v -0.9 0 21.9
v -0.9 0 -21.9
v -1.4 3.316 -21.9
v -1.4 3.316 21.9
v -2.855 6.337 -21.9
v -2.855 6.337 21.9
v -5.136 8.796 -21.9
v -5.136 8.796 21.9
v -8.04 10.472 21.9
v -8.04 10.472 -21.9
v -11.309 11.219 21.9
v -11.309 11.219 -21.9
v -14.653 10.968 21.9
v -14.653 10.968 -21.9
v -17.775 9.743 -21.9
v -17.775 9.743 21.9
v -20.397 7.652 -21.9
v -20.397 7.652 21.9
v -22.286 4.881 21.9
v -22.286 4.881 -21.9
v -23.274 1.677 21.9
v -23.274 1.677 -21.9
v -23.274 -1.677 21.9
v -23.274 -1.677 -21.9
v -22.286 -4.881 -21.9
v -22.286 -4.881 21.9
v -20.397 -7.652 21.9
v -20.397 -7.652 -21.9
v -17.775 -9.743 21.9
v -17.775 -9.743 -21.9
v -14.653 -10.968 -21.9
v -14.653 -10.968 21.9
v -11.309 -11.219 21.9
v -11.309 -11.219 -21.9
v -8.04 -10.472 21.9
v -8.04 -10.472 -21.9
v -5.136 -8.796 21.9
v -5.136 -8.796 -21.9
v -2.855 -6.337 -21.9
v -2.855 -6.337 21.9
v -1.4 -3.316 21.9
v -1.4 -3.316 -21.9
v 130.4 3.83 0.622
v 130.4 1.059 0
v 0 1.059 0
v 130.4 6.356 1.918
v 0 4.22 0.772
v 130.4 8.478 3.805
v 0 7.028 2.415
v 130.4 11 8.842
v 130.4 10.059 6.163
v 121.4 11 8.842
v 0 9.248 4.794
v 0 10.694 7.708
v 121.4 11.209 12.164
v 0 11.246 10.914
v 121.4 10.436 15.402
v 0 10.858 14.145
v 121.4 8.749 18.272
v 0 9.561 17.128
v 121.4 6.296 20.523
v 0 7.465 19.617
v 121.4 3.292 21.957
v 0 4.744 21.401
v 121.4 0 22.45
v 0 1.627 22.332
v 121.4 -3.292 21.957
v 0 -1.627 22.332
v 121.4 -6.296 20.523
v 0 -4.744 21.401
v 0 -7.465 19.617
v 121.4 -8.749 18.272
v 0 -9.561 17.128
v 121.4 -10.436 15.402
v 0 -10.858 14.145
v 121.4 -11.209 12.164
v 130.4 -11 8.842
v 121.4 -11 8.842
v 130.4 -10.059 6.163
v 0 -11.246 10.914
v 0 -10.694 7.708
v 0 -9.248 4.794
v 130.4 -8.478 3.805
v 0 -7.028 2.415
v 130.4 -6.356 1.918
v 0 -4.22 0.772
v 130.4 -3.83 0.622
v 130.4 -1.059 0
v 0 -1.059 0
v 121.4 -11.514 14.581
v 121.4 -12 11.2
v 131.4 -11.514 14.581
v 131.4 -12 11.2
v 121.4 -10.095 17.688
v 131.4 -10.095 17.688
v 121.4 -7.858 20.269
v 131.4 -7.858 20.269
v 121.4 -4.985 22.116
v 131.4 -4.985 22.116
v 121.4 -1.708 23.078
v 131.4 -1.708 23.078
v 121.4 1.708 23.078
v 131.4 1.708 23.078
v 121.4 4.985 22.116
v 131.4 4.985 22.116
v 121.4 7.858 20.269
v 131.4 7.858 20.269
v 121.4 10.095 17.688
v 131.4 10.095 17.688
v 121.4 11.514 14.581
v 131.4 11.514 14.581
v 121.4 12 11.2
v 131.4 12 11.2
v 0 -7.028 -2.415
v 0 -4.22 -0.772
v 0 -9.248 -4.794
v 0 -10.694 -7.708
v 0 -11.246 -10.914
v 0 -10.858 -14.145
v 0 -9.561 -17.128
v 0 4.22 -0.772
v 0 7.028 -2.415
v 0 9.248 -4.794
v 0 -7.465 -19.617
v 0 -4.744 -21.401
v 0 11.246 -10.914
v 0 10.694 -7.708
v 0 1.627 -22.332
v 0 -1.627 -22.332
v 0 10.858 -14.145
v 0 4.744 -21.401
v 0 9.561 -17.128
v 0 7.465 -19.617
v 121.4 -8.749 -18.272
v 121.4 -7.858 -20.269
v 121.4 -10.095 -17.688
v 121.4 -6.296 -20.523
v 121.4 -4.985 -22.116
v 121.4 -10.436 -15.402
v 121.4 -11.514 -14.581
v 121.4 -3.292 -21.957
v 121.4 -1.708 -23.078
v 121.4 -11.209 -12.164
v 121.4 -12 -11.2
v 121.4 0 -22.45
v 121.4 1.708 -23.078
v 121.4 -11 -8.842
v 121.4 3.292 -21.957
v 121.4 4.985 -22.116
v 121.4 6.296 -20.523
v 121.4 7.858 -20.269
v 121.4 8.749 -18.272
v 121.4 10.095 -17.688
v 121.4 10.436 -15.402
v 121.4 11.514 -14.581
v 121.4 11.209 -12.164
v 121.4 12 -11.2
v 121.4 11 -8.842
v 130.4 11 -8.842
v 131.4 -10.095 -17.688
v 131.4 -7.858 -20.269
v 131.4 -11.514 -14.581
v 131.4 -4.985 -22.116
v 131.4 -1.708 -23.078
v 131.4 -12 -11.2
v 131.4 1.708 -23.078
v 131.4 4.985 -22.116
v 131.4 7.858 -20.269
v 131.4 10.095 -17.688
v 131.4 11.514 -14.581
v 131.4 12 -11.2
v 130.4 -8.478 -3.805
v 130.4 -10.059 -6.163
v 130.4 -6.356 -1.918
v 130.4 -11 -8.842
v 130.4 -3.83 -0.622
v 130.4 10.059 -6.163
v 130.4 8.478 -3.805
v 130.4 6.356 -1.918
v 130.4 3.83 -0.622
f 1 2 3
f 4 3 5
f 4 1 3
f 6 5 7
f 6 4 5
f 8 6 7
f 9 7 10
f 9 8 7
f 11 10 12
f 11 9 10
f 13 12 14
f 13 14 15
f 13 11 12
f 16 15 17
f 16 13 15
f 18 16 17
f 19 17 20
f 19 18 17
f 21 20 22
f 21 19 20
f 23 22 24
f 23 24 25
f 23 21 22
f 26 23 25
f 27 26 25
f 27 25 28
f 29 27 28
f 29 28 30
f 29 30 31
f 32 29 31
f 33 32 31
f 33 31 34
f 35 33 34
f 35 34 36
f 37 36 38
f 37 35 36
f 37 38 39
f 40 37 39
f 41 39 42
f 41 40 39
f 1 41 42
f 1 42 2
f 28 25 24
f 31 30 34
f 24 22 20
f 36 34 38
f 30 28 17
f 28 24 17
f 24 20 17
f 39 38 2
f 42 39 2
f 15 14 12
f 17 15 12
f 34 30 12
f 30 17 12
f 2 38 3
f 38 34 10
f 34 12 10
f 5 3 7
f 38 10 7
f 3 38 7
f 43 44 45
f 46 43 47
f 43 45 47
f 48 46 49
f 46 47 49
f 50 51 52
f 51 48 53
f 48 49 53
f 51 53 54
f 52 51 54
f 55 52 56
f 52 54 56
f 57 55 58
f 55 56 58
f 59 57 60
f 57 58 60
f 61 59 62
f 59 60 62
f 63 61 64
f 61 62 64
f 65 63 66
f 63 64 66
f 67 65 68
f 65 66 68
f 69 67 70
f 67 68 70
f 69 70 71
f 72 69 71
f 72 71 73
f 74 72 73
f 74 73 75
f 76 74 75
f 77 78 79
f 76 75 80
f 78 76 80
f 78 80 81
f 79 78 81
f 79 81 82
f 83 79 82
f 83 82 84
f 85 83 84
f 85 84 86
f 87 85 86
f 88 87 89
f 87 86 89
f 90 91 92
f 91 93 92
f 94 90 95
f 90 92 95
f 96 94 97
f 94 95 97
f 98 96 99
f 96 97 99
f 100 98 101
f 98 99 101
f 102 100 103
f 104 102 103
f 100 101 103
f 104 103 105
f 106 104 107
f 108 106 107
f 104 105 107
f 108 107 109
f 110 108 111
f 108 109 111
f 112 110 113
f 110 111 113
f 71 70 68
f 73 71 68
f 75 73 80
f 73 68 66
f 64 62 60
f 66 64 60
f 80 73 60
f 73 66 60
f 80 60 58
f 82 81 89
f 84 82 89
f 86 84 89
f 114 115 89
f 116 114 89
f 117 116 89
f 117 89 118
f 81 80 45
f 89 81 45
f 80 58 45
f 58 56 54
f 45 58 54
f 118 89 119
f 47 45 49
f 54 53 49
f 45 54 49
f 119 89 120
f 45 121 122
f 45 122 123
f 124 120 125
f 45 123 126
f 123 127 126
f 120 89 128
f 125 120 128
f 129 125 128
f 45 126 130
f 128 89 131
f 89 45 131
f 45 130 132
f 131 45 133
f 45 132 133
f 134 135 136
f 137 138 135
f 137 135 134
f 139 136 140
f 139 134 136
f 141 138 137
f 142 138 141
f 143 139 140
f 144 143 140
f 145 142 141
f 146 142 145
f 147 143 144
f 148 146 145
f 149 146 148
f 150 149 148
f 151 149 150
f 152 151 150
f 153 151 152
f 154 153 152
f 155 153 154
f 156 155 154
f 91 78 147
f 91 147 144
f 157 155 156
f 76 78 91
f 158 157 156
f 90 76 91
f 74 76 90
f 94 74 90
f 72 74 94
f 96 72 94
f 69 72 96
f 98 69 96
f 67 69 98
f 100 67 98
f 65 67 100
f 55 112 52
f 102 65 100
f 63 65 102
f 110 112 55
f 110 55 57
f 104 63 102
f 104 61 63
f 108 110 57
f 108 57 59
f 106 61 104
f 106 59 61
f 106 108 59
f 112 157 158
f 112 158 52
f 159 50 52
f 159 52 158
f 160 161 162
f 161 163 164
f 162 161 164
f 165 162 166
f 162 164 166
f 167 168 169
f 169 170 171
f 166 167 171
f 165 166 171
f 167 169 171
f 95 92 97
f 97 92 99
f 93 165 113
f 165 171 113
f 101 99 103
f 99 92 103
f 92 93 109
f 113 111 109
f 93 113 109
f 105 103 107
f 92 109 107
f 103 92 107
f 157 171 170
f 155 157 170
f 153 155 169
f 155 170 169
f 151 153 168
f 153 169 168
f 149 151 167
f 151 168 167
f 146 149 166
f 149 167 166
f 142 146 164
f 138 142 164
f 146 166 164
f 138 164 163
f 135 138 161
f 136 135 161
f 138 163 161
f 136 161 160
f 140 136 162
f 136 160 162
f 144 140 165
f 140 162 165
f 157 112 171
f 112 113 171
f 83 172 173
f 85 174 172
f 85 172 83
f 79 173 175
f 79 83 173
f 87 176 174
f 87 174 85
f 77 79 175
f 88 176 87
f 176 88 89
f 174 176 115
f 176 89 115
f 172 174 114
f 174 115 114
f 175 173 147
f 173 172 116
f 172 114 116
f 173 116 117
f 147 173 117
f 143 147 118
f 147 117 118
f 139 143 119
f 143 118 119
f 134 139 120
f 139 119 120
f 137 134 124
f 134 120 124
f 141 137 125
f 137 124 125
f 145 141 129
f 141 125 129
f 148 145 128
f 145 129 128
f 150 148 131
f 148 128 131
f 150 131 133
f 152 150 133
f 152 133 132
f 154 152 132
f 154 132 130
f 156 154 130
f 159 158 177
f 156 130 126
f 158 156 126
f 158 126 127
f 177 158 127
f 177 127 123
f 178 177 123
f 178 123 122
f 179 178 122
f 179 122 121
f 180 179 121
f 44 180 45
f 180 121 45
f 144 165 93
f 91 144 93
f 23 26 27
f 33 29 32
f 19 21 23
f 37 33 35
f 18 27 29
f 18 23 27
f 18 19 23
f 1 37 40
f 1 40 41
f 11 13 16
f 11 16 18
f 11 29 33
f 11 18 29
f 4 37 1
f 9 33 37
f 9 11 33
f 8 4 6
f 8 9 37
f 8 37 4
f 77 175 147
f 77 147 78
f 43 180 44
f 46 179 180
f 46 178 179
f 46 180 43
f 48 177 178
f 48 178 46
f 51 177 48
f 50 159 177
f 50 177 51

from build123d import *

# Parameters (mm, degrees)
SKETCH1_R           = 11.25
BOSS_EXTRUDE1_DEPTH = 131.4
BOSS_EXTRUDE5_DEPTH = 1
BOSS_EXTRUDE6_DEPTH = 9
SKETCH4_R           = 11.25
BOSS_EXTRUDE7_DEPTH = 21.9


with BuildPart() as part:
    # Sketch1 → Boss-Extrude1 (new body)
    with BuildSketch(Plane(origin=(0, 0, 0), x_dir=(0, 0, -1), z_dir=(1, 0, 0))):
        with Locations((-11.2, 0)):
            Circle(SKETCH1_R)
        with Locations((11.2, 0)):
            Circle(SKETCH1_R)
        with Locations((11.2, 0)):
            Circle(SKETCH1_R)
        with Locations((-11.2, 0)):
            Circle(SKETCH1_R)
    extrude(amount=BOSS_EXTRUDE1_DEPTH)

    # Sketch2 → Boss-Extrude5 (add)
    with BuildSketch(Plane(origin=(131.4, 0, 0), x_dir=(0, 0, -1), z_dir=(1, 0, 0))):
        with BuildLine():
            Line((11.2, -12), (-11.2, -12))
            ThreePointArc((-11.2, -12), (-23.2, 0), (-11.2, 12))
            Line((-11.2, 12), (11.2, 12))
            ThreePointArc((11.2, 12), (23.2, 0), (11.2, -12))
        make_face()
    extrude(amount=-BOSS_EXTRUDE5_DEPTH)

    # Sketch3 → Boss-Extrude6 (add)
    with BuildSketch(Plane.ZY.offset(-130.4)):
        with BuildLine():
            Line((-11.2, -12), (11.2, -12))
            ThreePointArc((11.2, -12), (23.2, 0), (11.2, 12))
            Line((11.2, 12), (-11.2, 12))
            ThreePointArc((-11.2, 12), (-23.2, 0), (-11.2, -12))
        make_face()
        with BuildLine():
            Line((-11.2, -11), (11.2, -11))
            ThreePointArc((11.2, -11), (22.2, 0), (11.2, 11))
            Line((11.2, 11), (-11.2, 11))
            ThreePointArc((-11.2, 11), (-22.2, 0), (-11.2, -11))
        make_face(mode=Mode.SUBTRACT)
    extrude(amount=BOSS_EXTRUDE6_DEPTH)


with BuildPart() as body_2:
    # Sketch4 → Boss-Extrude7 (new, symmetric)
    with BuildSketch(Plane.XY):
        with Locations((-12.15, 0)):
            Circle(SKETCH4_R)
    extrude(amount=BOSS_EXTRUDE7_DEPTH, both=True)


solid = Compound([part.part, body_2.part])
